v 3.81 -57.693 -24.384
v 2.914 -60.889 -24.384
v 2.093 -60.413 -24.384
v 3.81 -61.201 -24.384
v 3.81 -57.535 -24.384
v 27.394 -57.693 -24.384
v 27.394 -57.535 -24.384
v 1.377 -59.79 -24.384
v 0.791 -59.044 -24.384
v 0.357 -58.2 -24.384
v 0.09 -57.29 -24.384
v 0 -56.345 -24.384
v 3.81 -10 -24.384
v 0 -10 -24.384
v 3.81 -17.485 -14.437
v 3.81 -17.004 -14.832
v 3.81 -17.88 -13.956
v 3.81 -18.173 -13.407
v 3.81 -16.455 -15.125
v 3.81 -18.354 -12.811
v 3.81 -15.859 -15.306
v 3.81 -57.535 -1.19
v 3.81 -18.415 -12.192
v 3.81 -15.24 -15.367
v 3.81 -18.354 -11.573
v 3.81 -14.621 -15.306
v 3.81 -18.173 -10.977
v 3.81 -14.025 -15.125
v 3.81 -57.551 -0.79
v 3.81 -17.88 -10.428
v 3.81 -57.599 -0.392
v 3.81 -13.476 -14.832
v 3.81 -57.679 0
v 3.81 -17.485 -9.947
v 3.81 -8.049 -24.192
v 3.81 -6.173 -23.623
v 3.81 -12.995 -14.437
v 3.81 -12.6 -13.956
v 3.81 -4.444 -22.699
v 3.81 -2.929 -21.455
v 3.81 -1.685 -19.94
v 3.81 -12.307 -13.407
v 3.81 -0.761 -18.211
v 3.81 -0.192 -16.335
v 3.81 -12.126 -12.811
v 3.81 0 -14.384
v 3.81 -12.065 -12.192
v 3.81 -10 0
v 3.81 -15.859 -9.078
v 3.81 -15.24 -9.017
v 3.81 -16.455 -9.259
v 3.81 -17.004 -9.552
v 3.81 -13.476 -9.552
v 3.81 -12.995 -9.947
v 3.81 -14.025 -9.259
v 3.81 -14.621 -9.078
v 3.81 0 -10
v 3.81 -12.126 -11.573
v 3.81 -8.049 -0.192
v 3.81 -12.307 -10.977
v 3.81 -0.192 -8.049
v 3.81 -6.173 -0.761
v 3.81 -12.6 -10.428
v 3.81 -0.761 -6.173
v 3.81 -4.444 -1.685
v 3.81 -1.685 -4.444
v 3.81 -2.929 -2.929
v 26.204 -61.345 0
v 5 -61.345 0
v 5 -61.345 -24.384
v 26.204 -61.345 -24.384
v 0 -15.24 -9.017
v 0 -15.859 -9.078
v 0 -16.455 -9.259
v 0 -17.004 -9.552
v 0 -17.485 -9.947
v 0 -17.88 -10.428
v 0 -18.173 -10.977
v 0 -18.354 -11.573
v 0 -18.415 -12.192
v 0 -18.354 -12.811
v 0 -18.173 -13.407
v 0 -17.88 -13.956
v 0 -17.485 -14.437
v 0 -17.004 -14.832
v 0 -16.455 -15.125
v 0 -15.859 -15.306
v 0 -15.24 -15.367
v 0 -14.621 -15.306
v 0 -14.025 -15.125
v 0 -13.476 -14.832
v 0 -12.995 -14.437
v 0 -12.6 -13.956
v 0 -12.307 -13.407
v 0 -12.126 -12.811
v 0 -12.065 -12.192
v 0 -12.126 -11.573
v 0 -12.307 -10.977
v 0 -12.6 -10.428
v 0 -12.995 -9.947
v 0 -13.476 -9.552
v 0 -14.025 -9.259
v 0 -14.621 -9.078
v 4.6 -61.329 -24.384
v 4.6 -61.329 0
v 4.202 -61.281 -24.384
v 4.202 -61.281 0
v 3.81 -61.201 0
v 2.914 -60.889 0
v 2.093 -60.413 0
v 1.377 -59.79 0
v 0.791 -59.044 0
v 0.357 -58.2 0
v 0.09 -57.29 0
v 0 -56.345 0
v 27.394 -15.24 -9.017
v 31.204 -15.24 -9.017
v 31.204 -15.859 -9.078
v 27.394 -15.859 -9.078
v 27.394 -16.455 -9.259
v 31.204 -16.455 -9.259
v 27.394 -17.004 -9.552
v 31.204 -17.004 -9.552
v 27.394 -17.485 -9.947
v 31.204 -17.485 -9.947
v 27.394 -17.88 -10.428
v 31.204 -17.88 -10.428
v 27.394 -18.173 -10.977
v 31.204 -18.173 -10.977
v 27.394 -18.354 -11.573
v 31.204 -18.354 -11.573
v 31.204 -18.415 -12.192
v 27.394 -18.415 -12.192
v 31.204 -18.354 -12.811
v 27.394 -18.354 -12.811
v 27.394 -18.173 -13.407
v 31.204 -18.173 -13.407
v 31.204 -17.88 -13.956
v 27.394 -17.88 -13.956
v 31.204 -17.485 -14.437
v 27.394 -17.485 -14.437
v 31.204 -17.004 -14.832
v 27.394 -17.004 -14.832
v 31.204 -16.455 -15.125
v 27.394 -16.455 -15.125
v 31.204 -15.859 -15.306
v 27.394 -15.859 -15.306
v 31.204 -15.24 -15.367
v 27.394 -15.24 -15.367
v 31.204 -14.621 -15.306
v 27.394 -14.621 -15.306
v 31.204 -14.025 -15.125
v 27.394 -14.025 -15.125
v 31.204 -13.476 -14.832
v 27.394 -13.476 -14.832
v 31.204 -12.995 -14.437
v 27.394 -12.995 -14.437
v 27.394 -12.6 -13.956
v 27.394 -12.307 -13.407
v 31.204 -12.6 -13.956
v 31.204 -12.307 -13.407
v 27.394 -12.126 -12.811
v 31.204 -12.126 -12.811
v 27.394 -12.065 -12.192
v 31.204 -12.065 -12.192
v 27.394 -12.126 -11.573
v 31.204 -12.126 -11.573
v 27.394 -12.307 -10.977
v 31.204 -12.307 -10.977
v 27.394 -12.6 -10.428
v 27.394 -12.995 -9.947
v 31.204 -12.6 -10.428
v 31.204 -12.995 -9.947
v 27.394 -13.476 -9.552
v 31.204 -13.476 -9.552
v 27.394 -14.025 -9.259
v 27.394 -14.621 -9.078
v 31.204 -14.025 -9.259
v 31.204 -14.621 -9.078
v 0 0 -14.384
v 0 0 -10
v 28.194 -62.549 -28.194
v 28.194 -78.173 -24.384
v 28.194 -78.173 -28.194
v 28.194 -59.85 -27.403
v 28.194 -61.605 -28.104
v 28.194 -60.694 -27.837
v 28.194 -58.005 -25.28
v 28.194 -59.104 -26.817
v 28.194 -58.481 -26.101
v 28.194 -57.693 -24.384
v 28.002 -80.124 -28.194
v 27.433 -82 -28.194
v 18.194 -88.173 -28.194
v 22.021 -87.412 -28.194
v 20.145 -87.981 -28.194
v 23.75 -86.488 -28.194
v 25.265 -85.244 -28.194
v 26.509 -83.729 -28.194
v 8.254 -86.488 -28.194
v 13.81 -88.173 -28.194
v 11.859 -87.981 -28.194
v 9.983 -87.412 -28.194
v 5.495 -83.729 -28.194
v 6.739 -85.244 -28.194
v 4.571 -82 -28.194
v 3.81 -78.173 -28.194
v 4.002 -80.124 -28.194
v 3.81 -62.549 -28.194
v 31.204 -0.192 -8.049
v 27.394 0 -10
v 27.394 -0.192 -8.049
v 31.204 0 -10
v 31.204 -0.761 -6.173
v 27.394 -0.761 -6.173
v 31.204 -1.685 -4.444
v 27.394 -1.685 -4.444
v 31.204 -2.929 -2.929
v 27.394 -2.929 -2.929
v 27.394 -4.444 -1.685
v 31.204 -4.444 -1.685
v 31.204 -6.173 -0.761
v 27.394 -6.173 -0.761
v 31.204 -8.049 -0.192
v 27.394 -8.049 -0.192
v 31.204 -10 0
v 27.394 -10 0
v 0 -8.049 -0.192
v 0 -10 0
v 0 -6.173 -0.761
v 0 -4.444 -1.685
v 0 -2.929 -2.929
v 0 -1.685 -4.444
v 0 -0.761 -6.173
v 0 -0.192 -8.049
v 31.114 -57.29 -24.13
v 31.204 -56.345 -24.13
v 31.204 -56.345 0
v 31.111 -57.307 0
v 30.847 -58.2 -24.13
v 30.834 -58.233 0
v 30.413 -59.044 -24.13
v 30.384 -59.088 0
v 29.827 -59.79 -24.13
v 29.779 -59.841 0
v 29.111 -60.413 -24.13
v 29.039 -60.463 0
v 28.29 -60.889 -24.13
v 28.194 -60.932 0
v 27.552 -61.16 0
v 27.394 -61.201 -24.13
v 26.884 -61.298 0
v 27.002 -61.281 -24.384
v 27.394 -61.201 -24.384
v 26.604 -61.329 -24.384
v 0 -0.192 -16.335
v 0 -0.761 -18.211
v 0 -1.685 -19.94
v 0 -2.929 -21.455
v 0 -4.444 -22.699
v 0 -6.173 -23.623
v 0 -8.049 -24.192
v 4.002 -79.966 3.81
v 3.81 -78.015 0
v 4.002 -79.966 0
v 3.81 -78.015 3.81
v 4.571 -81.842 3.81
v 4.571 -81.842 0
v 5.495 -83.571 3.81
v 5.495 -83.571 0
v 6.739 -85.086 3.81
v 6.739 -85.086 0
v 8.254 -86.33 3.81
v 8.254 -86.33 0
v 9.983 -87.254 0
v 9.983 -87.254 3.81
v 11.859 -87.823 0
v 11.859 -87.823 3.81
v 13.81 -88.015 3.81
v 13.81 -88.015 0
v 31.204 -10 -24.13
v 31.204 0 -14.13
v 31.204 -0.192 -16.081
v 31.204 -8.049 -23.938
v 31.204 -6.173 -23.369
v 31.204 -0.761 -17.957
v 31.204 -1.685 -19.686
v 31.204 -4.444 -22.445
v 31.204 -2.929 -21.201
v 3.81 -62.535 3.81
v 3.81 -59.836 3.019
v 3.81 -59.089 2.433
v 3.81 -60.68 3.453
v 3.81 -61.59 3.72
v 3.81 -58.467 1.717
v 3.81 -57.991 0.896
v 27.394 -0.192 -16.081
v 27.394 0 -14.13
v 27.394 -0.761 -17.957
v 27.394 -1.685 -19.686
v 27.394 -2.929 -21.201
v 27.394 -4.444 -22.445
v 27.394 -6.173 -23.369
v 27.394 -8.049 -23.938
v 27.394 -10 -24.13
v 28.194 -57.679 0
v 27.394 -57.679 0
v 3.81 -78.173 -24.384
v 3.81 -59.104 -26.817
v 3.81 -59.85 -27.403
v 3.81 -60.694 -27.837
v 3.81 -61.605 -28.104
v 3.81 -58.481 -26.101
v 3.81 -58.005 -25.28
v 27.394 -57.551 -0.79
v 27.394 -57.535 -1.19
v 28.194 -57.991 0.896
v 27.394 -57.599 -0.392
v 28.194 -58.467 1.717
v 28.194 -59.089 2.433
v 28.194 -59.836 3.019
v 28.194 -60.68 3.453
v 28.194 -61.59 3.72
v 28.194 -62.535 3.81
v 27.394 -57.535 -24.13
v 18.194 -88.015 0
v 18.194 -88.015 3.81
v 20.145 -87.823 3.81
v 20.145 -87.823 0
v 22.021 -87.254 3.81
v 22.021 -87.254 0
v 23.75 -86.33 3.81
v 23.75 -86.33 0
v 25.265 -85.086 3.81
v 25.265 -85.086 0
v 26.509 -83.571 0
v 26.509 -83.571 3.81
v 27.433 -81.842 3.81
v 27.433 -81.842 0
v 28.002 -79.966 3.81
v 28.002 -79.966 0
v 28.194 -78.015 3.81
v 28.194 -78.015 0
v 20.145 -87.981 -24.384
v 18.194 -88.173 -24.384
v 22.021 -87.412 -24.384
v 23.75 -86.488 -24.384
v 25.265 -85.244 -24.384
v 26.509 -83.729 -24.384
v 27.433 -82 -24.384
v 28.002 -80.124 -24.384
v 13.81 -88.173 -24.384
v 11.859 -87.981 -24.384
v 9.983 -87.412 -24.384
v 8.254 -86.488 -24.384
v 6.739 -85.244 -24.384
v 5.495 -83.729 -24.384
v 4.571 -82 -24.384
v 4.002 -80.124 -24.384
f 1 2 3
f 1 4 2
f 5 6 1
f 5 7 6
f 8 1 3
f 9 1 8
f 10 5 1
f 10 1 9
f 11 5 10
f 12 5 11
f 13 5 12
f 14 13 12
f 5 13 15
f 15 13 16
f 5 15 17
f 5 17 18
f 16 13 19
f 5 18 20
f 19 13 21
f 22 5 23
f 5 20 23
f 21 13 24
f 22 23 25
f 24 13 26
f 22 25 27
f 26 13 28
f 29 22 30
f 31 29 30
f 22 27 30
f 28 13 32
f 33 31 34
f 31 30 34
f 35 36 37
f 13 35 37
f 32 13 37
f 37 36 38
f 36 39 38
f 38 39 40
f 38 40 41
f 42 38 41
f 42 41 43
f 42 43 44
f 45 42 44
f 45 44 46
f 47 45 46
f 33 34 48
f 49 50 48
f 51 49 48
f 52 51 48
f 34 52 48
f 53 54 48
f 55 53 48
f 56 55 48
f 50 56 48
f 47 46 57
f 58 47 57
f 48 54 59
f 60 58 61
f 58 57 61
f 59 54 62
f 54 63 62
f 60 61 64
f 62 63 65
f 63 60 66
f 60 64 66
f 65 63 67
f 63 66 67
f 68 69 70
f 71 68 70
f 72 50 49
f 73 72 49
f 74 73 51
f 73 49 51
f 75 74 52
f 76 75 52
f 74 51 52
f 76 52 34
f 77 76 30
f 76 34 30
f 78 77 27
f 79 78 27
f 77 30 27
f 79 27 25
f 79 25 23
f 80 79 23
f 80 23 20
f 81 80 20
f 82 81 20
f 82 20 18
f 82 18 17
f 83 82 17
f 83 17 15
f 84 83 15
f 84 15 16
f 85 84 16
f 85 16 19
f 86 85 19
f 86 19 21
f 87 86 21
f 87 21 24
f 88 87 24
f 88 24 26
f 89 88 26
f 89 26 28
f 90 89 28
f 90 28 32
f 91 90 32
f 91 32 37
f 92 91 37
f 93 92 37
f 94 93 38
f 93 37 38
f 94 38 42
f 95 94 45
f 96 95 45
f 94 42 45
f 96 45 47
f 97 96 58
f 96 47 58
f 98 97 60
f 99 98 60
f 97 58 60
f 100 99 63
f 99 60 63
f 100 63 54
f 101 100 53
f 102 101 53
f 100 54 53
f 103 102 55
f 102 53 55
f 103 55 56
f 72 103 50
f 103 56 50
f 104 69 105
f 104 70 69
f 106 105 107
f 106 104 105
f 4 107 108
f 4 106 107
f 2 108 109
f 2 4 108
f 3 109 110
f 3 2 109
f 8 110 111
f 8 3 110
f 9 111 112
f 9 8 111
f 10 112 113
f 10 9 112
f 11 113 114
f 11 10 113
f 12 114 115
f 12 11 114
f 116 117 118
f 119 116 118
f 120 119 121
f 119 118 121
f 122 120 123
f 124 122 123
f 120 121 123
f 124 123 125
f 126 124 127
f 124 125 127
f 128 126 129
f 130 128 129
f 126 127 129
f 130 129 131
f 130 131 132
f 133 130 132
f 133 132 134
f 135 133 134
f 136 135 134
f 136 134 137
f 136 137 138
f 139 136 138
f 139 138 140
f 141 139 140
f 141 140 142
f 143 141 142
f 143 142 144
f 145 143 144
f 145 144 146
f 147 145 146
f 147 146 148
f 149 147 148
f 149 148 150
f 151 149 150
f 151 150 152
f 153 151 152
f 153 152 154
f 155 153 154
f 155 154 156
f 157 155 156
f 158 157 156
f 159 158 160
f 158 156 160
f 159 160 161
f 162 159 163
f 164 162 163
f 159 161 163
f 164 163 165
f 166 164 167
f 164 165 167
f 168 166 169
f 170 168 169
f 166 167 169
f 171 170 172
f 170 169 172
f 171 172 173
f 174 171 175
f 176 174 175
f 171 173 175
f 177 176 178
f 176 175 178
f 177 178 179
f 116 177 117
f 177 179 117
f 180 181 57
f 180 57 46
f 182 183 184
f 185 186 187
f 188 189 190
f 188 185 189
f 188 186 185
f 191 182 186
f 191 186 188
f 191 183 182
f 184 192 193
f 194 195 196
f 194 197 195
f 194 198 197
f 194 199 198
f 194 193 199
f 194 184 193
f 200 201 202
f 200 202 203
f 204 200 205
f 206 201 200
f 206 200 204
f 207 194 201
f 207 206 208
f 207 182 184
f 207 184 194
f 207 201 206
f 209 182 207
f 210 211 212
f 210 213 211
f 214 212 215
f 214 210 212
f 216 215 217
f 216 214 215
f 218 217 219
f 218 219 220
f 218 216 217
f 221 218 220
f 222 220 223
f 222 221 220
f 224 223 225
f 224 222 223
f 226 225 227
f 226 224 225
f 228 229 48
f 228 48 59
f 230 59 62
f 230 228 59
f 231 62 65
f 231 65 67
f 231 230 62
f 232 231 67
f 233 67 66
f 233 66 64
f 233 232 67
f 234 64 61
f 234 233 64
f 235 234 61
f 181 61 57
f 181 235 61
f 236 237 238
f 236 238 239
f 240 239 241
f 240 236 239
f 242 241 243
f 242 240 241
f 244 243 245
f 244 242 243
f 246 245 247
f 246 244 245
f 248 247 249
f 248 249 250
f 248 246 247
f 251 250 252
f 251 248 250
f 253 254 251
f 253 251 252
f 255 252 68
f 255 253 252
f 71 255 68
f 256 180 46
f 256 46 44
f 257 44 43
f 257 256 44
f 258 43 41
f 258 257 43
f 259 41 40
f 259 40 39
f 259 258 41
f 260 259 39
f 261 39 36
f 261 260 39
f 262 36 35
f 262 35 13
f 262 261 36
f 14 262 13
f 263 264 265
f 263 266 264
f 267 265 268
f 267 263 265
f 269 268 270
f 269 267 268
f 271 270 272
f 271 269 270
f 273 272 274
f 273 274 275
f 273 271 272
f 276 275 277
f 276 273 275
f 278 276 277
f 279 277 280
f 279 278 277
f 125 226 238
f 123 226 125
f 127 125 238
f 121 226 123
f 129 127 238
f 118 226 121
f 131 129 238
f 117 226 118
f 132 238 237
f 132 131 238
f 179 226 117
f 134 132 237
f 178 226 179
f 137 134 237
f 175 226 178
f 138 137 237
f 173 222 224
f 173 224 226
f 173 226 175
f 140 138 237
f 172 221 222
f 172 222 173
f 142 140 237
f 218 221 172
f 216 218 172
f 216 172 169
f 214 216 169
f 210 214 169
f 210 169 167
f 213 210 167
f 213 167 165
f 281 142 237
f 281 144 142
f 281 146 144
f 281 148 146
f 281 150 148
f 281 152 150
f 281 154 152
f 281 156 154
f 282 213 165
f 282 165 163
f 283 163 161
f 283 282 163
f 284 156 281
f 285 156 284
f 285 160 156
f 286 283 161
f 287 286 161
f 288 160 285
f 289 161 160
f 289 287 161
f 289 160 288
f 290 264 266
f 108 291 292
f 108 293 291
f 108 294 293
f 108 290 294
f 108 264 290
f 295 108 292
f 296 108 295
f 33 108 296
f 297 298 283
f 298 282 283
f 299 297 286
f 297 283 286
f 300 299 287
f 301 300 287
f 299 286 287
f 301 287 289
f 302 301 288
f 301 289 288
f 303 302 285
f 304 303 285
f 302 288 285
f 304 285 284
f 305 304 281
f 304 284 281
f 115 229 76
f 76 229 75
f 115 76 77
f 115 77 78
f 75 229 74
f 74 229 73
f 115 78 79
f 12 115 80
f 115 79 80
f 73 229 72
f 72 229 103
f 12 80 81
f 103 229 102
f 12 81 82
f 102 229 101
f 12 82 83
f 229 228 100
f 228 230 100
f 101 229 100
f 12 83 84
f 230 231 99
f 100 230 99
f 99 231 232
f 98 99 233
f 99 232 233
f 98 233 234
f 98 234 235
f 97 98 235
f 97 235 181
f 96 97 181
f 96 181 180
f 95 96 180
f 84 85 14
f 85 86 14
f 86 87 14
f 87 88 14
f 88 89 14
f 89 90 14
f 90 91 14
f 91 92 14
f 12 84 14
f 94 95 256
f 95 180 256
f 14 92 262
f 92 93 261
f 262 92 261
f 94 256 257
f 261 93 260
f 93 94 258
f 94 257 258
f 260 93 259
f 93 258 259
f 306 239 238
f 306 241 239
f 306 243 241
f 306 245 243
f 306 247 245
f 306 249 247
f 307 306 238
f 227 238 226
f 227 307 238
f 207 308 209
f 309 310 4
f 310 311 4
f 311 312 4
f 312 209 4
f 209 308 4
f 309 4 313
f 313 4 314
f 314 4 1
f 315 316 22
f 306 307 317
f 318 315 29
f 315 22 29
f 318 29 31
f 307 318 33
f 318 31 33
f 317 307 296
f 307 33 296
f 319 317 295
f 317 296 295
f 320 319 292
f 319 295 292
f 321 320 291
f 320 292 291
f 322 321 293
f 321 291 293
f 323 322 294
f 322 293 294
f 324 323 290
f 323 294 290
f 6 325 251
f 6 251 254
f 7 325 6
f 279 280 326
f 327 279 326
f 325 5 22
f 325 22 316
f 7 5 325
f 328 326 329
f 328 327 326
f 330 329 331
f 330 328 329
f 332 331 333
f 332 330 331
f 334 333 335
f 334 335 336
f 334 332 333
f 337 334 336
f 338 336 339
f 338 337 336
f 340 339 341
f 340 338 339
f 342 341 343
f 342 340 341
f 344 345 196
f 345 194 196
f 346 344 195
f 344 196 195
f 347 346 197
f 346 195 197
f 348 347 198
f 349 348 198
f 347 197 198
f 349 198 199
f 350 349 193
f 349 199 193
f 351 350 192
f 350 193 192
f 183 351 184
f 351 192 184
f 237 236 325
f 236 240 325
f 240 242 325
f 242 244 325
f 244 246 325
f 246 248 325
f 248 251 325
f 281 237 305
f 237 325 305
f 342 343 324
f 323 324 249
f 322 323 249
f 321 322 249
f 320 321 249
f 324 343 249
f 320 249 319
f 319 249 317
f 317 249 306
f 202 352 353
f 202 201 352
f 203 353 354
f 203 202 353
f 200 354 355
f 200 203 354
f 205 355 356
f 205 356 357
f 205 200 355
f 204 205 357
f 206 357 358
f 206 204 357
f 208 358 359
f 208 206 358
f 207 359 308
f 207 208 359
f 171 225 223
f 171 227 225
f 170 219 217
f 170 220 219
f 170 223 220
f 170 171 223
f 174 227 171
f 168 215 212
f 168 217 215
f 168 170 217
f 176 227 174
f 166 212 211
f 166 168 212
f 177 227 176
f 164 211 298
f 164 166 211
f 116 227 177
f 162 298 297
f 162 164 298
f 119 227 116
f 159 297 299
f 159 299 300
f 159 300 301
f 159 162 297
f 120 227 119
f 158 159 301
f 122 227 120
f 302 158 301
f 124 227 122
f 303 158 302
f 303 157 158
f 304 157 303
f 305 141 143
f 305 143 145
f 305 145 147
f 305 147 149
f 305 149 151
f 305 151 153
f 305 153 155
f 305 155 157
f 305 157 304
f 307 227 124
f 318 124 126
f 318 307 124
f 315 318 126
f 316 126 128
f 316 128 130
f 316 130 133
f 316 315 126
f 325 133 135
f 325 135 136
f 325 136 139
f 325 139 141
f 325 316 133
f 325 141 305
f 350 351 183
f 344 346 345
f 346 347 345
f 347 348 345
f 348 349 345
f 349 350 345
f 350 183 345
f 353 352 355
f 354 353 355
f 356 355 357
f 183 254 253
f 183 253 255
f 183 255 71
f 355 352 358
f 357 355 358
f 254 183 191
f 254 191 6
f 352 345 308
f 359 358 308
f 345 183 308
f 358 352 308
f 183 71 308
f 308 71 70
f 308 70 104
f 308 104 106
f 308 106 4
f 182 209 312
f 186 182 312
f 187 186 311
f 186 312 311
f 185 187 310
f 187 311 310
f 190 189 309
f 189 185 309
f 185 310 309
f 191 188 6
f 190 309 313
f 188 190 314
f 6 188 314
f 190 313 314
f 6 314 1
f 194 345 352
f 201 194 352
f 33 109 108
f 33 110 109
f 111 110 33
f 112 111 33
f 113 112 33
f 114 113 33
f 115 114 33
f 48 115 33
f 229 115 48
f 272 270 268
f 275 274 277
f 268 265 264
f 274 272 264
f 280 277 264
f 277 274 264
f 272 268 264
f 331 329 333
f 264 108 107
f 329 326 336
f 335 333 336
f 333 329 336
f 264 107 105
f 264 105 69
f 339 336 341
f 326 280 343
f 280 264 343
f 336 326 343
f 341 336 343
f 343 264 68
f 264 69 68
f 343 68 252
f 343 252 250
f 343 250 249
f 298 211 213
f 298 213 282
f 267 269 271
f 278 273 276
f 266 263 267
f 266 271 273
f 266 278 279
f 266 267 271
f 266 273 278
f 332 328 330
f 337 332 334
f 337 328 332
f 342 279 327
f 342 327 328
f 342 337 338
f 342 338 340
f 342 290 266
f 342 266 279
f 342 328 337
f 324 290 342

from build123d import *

# Parameters (mm, degrees)
BOSS_EXTRUDE1_DEPTH         = 3.81
SKETCH2_W                   = 27.394147034
SKETCH2_H                   = 24.384
BOSS_EXTRUDE2_DEPTH         = 3.81
SKETCH7_W                   = 24.13
SKETCH7_H                   = 61.344873393
BOSS_EXTRUDE3_DEPTH         = 3.81
FILLET1_R                   = 10
FILLET2_R                   = 10
FILLET3_R                   = 5
FILLET4_R                   = 5
SKETCH8_W                   = 24.384
SKETCH8_H                   = 30.48
BOSS_EXTRUDE4_DEPTH         = 3.81
FILLET5_R                   = 5
FILLET6_R                   = 10
FILLET8_R                   = 10
SKETCH9_W                   = 24.384
SKETCH9_H                   = 30.48
BOSS_EXTRUDE5_DEPTH         = 3.81
FILLET9_R                   = 10
FILLET10_R                  = 10
FILLET11_R                  = 5
F_1_4_0_25_DIAMETER_HOLE1_D = 6.35


with BuildPart() as part:
    # Sketch1 → Boss-Extrude1 (new body)
    with BuildSketch(Plane(origin=(0, 0, 0), x_dir=(0, 0, -1), z_dir=(1, 0, 0))):
        with BuildLine():
            Line((10, 0), (14.384, 0))
            ThreePointArc((14.384, 0), (21.455067812, -2.928932188), (24.384, -10))
            Line((24.384, -10), (24.384, -57.534873393))
            Line((24.384, -57.534873393), (0, -57.534873393))
            Line((0, -57.534873393), (0, -10))
            ThreePointArc((0, -10), (2.928932188, -2.928932188), (10, 0))
        make_face()
    extrude(amount=BOSS_EXTRUDE1_DEPTH)

    # Sketch2 → Boss-Extrude2 (add)
    with BuildSketch(Plane(origin=(0, -57.534873393, 0), x_dir=(-1, 0, 0), z_dir=(0, -1, 0))):
        with Locations((-13.697073517, 12.192)):
            Rectangle(SKETCH2_W, SKETCH2_H)
    extrude(amount=BOSS_EXTRUDE2_DEPTH)

    # Sketch7 → Boss-Extrude3 (add)
    with BuildSketch(Plane(origin=(27.394147034, 0, 0), x_dir=(0, 0, -1), z_dir=(1, 0, 0))):
        with Locations((12.065, -30.672436697)):
            Rectangle(SKETCH7_W, SKETCH7_H)
    extrude(amount=BOSS_EXTRUDE3_DEPTH)

    # Fillet1
    fillet1_edges = [part.edges().sort_by_distance(p)[0] for p in [
        (29.299147034, 0, -24.13),
    ]]
    fillet(fillet1_edges, radius=FILLET1_R)

    # Fillet2
    fillet2_edges = [part.edges().sort_by_distance(p)[0] for p in [
        (29.299147034, 0, 0),
    ]]
    fillet(fillet2_edges, radius=FILLET2_R)

    # Fillet3
    fillet3_edges = [part.edges().sort_by_distance(p)[0] for p in [
        (31.204147034, -61.344873393, -12.065),
    ]]
    fillet(fillet3_edges, radius=FILLET3_R)

    # Fillet4
    fillet4_edges = [part.edges().sort_by_distance(p)[0] for p in [
        (0, -61.344873393, -12.192),
    ]]
    fillet(fillet4_edges, radius=FILLET4_R)

    # Sketch8 → Boss-Extrude4 (add)
    with BuildSketch(Plane(origin=(0, 0, -24.384), x_dir=(-1, 0, 0), z_dir=(0, 0, -1))):
        with Locations((-16.002, -72.933007505)):
            Rectangle(SKETCH8_W, SKETCH8_H)
    extrude(amount=BOSS_EXTRUDE4_DEPTH)

    # Fillet5
    # the kernel refuses this fillet: 5 mm, written as the material it takes off along each edge
    with BuildSketch(Plane(origin=(-8.330814429, -57.693007505, -28.194), x_dir=(0, 0, 1), z_dir=(1, 0, 0))) as fillet5_piece_1:
        with BuildLine():
            CenterArc((5, 4.856325772), FILLET5_R, 180, 76.231471248)
            Line((0, 4.856325772), (-0.1, 4.856325772))
            Line((-0.1, 4.856325772), (-0.1, 0))
            Line((-0.1, 0), (0, -0.1))
            ThreePointArc((0, -0.1), (1.905, -0.1), (3.7862, -0.097126515))
            Line((3.7862, -0.097126515), (3.81, 0))
        make_face()
    extrude(amount=48.665628858, mode=Mode.SUBTRACT)

    # Fillet6
    fillet6_edges = [part.edges().sort_by_distance(p)[0] for p in [
        (3.81, -88.173007505, -26.289),
    ]]
    fillet(fillet6_edges, radius=FILLET6_R)

    # Fillet8
    fillet8_edges = [part.edges().sort_by_distance(p)[0] for p in [
        (28.194, -88.173007505, -26.289),
    ]]
    fillet(fillet8_edges, radius=FILLET8_R)

    # Sketch9 → Boss-Extrude5 (add)
    with BuildSketch(Plane.XY):
        with Locations((16.002, -72.774873393)):
            Rectangle(SKETCH9_W, SKETCH9_H)
    extrude(amount=BOSS_EXTRUDE5_DEPTH)

    # Fillet9
    fillet9_edges = [part.edges().sort_by_distance(p)[0] for p in [
        (3.81, -88.014873393, 1.905),
    ]]
    fillet(fillet9_edges, radius=FILLET9_R)

    # Fillet10
    fillet10_edges = [part.edges().sort_by_distance(p)[0] for p in [
        (28.194, -88.014873393, 1.905),
    ]]
    fillet(fillet10_edges, radius=FILLET10_R)

    # Fillet11
    # the kernel refuses this fillet: 5 mm, written as the material it takes off along each edge
    with BuildSketch(Plane(origin=(3.81, -57.534873393, 3.81), x_dir=(0, -1, 0), z_dir=(1, 0, 0))) as fillet11_piece_1_section:
        with BuildLine():
            CenterArc((FILLET11_R, FILLET11_R), FILLET11_R, 180, 90)
            Line((0, FILLET11_R), (0, 0))
            Line((0, 0), (FILLET11_R, 0))
        make_face()
    fillet11_piece_1 = extrude(amount=36.884, mode=Mode.PRIVATE)
    fillet11_piece_1 = split(fillet11_piece_1, bisect_by=Plane(origin=(27.394147034, -58.779272815, 2.781917075), z_dir=(-1, 0, 0)), keep=Keep.TOP, mode=Mode.PRIVATE)
    add(fillet11_piece_1, mode=Mode.SUBTRACT)
    with BuildSketch(Plane(origin=(-8.69, -57.534873393, 3.81), x_dir=(0, -1, 0), z_dir=(1, 0, 0))) as fillet11_piece_2_section:
        with BuildLine():
            CenterArc((FILLET11_R, FILLET11_R), FILLET11_R, 180, 90)
            Line((0, FILLET11_R), (0, 0))
            Line((0, 0), (FILLET11_R, 0))
        make_face()
    fillet11_piece_2 = extrude(amount=49.384, mode=Mode.PRIVATE)
    fillet11_piece_2 = split(fillet11_piece_2, bisect_by=Plane(origin=(27.831342884, -61.431899575, 0), z_dir=(0, 0, 1)), keep=Keep.TOP, mode=Mode.PRIVATE)
    add(fillet11_piece_2, mode=Mode.SUBTRACT)

    # 1/4 (0.25) Diameter Hole1 (through all)
    with Locations(Plane(origin=(0, -15.24, -12.192), x_dir=(0, 0, -1), z_dir=(-1, 0, 0))):
        with Locations((0, 0)):
            Hole(F_1_4_0_25_DIAMETER_HOLE1_D / 2)


solid = part.part
